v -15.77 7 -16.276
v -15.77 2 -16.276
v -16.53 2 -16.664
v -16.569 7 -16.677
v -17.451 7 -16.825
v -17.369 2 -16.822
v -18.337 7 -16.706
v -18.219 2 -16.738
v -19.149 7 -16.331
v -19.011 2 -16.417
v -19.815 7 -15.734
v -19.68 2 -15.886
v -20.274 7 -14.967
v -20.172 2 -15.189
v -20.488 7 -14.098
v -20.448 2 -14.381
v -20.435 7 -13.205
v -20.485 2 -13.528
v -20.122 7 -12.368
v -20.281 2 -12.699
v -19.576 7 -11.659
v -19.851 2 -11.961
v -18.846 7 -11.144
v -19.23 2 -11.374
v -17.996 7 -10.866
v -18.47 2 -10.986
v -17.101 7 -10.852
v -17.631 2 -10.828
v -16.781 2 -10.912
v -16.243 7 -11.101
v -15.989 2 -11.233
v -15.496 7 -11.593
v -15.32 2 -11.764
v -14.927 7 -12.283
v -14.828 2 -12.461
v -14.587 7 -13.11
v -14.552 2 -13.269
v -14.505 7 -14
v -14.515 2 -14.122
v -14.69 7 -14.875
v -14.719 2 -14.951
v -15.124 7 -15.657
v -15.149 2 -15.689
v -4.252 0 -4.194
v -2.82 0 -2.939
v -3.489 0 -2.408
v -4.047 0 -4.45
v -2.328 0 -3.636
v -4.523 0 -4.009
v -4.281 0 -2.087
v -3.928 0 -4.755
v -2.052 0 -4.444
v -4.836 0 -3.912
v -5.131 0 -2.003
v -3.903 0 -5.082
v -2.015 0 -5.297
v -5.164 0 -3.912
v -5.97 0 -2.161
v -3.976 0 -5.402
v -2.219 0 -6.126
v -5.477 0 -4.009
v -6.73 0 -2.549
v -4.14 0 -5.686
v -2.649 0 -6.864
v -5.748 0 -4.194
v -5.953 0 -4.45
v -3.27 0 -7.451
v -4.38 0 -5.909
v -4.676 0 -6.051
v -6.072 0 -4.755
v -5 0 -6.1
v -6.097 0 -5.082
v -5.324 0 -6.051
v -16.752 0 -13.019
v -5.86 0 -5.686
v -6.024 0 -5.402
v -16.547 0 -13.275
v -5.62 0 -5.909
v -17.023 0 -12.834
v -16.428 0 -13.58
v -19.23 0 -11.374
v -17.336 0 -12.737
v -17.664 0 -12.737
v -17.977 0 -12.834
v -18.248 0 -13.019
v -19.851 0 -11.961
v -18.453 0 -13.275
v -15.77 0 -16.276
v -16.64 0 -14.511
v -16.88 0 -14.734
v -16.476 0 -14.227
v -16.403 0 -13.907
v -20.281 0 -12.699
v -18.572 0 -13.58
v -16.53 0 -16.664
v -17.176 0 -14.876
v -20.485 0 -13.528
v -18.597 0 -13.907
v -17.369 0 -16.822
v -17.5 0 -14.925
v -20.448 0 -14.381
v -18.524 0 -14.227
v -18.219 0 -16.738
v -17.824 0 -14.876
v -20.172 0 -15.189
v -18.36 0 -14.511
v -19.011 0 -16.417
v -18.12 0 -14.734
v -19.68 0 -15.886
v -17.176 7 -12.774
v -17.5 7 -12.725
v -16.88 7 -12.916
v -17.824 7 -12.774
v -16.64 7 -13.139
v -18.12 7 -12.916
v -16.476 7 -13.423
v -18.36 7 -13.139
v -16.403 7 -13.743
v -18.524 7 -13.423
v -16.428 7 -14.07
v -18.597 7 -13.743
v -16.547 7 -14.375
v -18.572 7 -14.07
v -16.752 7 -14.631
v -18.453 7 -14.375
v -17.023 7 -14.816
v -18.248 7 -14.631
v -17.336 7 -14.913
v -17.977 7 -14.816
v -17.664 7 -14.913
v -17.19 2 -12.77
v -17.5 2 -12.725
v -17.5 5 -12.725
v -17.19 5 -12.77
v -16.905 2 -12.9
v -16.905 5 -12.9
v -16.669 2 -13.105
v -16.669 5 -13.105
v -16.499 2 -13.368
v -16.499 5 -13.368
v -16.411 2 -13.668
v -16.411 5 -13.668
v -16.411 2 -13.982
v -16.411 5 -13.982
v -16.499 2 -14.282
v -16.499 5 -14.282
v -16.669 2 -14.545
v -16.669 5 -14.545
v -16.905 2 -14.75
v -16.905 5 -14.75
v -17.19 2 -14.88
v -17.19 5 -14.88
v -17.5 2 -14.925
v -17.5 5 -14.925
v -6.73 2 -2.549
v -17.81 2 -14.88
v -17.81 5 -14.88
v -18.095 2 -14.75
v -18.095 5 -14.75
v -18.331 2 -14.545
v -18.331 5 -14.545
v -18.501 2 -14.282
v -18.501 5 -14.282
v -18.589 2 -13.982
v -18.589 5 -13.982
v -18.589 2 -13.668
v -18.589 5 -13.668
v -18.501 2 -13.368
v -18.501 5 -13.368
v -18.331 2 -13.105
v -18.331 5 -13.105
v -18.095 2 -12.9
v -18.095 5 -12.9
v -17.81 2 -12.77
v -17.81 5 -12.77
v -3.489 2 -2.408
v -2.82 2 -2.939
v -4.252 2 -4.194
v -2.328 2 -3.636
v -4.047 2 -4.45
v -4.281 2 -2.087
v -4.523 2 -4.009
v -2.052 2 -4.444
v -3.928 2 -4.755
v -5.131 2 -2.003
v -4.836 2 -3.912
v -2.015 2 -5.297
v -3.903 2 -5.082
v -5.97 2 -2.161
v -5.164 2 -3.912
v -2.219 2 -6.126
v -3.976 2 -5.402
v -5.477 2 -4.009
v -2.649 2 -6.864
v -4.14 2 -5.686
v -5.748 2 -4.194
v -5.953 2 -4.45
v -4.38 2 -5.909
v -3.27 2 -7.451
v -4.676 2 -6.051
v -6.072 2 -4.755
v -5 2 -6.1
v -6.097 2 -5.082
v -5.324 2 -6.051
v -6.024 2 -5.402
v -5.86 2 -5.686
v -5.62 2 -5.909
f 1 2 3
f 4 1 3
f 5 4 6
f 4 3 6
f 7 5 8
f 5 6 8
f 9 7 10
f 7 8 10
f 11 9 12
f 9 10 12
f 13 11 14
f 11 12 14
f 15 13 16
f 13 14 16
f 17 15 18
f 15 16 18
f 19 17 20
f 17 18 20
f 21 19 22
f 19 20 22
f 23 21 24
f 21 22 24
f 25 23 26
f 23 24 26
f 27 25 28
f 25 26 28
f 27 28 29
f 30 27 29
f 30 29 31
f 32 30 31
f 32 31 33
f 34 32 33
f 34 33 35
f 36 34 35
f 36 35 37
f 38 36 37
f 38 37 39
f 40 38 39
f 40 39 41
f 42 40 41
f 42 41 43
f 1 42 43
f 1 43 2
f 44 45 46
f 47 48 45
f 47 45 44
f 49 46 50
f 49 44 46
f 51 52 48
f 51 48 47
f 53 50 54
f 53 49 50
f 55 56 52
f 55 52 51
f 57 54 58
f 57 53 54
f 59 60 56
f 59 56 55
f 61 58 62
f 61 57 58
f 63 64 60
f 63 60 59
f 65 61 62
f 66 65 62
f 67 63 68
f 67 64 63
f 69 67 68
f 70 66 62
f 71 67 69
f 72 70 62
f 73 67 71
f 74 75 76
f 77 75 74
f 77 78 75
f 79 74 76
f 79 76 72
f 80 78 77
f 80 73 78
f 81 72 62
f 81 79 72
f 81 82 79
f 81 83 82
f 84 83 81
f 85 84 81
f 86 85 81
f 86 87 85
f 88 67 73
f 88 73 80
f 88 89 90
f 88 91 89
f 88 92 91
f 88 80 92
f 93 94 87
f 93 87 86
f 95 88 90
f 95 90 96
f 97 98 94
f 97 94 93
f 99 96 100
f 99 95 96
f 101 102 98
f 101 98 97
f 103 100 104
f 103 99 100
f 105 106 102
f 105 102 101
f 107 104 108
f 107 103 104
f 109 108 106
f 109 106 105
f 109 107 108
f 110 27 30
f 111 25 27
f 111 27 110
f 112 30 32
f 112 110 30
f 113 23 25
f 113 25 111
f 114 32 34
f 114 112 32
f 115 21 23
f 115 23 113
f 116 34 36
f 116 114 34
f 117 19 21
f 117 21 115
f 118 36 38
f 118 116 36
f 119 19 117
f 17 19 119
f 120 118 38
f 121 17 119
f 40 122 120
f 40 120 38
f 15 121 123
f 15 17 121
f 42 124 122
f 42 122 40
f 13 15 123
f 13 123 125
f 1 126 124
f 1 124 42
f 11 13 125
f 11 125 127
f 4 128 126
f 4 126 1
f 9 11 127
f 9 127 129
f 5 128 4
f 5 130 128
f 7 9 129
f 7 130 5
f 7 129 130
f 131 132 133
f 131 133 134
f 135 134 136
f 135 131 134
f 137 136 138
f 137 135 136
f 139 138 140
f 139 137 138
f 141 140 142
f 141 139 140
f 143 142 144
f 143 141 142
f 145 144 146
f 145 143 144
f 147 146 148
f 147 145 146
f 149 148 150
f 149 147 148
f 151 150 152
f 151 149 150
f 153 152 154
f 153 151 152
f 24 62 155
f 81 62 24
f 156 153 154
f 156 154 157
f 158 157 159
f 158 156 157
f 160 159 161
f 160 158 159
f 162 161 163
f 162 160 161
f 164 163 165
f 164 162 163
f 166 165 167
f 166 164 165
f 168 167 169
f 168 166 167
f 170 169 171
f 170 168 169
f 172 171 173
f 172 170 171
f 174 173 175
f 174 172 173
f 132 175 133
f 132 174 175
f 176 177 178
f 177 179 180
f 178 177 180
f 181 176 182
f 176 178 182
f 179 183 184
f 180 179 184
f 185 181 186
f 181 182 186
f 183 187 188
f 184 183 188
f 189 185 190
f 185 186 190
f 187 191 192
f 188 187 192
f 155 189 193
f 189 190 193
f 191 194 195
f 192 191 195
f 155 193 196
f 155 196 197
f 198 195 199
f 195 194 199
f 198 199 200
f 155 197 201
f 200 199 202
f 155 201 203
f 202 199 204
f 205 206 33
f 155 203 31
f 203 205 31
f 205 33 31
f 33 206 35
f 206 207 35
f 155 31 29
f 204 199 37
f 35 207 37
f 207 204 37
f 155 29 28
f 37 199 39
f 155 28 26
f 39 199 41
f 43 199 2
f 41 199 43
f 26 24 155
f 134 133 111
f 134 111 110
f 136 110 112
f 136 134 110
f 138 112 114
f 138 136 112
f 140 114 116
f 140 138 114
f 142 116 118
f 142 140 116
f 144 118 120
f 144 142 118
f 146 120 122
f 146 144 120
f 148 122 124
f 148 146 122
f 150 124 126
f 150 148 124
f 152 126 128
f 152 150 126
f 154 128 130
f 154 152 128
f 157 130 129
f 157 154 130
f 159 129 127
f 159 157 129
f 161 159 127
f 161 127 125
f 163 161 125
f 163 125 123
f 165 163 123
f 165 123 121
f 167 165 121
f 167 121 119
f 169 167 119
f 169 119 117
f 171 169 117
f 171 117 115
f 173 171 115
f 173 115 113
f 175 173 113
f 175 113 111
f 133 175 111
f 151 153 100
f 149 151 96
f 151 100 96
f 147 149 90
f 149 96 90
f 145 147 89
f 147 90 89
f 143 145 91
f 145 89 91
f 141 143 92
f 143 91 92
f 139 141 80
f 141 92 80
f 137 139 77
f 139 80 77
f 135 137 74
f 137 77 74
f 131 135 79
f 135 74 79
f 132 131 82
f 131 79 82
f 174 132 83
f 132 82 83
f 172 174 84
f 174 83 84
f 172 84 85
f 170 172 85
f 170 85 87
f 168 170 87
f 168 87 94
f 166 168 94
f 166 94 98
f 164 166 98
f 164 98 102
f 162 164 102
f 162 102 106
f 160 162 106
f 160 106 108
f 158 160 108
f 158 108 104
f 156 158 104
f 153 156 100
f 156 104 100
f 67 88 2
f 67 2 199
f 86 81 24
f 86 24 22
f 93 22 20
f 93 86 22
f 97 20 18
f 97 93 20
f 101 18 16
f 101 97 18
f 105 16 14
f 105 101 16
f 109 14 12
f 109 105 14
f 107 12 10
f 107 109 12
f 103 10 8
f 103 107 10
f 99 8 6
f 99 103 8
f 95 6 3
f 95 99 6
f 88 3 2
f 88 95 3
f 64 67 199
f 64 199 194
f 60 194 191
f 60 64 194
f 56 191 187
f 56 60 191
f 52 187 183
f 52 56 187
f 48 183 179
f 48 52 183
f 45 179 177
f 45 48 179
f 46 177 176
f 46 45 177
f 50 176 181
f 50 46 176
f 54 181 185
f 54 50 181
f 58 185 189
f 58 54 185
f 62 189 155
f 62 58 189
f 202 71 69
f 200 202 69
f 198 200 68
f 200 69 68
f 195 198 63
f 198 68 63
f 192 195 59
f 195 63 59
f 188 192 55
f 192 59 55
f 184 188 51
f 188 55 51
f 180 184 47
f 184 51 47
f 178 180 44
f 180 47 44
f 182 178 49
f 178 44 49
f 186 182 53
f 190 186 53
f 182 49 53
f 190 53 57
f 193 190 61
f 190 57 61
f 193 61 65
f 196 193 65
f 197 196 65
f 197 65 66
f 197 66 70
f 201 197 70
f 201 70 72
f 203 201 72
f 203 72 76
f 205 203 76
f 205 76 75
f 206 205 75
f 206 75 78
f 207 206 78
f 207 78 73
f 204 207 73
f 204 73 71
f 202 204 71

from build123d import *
from build123d.topology import SkipClean

# Parameters (mm, degrees)
BOSS_EXTRUDE1_DEPTH = 2
SKETCH2_R           = 3
SKETCH2_R_2         = 1.1
BOSS_EXTRUDE2_DEPTH = 5
SKETCH4_R           = 1.1
CUT_EXTRUDE1_DEPTH  = 5


with BuildPart() as part:
    # Sketch1 → Boss-Extrude1 (new body)
    with BuildSketch(Plane(origin=(0, 0, 0), x_dir=(1, 0, 0), z_dir=(0, 1, 0))):
        with BuildLine():
            Line((-15.769757973, 16.275767743), (-3.269757973, 7.450767743))
            ThreePointArc((-3.269757973, 7.450767743), (-2.549232257, 3.269757973), (-6.730242027, 2.549232257))
            Line((-6.730242027, 2.549232257), (-19.230242027, 11.374232257))
            ThreePointArc((-19.230242027, 11.374232257), (-19.950767743, 15.555242027), (-15.769757973, 16.275767743))
        make_face()
    extrude(amount=BOSS_EXTRUDE1_DEPTH)

    # Sketch2 → Boss-Extrude2 (add)
    with SkipClean():  # the faces are left unmerged after this step: merging them gives an invalid solid
        with BuildSketch(Plane(origin=(0, 2, 0), x_dir=(1, 0, 0), z_dir=(0, 1, 0))):
            with Locations((-17.5, 13.825)):
                Circle(SKETCH2_R)
            with Locations((-17.5, 13.825)):
                Circle(SKETCH2_R_2, mode=Mode.SUBTRACT)
        extrude(amount=BOSS_EXTRUDE2_DEPTH)

    # Sketch4 → Cut-Extrude1 (cut)
    with SkipClean():  # the faces are left unmerged after this step: merging them gives an invalid solid
        with BuildSketch(Plane.XZ):
            with Locations((-5, -5)):
                Circle(SKETCH4_R)
            with Locations((-17.5, -13.825)):
                Circle(SKETCH4_R)
        extrude(amount=-CUT_EXTRUDE1_DEPTH, mode=Mode.SUBTRACT)


solid = part.part
